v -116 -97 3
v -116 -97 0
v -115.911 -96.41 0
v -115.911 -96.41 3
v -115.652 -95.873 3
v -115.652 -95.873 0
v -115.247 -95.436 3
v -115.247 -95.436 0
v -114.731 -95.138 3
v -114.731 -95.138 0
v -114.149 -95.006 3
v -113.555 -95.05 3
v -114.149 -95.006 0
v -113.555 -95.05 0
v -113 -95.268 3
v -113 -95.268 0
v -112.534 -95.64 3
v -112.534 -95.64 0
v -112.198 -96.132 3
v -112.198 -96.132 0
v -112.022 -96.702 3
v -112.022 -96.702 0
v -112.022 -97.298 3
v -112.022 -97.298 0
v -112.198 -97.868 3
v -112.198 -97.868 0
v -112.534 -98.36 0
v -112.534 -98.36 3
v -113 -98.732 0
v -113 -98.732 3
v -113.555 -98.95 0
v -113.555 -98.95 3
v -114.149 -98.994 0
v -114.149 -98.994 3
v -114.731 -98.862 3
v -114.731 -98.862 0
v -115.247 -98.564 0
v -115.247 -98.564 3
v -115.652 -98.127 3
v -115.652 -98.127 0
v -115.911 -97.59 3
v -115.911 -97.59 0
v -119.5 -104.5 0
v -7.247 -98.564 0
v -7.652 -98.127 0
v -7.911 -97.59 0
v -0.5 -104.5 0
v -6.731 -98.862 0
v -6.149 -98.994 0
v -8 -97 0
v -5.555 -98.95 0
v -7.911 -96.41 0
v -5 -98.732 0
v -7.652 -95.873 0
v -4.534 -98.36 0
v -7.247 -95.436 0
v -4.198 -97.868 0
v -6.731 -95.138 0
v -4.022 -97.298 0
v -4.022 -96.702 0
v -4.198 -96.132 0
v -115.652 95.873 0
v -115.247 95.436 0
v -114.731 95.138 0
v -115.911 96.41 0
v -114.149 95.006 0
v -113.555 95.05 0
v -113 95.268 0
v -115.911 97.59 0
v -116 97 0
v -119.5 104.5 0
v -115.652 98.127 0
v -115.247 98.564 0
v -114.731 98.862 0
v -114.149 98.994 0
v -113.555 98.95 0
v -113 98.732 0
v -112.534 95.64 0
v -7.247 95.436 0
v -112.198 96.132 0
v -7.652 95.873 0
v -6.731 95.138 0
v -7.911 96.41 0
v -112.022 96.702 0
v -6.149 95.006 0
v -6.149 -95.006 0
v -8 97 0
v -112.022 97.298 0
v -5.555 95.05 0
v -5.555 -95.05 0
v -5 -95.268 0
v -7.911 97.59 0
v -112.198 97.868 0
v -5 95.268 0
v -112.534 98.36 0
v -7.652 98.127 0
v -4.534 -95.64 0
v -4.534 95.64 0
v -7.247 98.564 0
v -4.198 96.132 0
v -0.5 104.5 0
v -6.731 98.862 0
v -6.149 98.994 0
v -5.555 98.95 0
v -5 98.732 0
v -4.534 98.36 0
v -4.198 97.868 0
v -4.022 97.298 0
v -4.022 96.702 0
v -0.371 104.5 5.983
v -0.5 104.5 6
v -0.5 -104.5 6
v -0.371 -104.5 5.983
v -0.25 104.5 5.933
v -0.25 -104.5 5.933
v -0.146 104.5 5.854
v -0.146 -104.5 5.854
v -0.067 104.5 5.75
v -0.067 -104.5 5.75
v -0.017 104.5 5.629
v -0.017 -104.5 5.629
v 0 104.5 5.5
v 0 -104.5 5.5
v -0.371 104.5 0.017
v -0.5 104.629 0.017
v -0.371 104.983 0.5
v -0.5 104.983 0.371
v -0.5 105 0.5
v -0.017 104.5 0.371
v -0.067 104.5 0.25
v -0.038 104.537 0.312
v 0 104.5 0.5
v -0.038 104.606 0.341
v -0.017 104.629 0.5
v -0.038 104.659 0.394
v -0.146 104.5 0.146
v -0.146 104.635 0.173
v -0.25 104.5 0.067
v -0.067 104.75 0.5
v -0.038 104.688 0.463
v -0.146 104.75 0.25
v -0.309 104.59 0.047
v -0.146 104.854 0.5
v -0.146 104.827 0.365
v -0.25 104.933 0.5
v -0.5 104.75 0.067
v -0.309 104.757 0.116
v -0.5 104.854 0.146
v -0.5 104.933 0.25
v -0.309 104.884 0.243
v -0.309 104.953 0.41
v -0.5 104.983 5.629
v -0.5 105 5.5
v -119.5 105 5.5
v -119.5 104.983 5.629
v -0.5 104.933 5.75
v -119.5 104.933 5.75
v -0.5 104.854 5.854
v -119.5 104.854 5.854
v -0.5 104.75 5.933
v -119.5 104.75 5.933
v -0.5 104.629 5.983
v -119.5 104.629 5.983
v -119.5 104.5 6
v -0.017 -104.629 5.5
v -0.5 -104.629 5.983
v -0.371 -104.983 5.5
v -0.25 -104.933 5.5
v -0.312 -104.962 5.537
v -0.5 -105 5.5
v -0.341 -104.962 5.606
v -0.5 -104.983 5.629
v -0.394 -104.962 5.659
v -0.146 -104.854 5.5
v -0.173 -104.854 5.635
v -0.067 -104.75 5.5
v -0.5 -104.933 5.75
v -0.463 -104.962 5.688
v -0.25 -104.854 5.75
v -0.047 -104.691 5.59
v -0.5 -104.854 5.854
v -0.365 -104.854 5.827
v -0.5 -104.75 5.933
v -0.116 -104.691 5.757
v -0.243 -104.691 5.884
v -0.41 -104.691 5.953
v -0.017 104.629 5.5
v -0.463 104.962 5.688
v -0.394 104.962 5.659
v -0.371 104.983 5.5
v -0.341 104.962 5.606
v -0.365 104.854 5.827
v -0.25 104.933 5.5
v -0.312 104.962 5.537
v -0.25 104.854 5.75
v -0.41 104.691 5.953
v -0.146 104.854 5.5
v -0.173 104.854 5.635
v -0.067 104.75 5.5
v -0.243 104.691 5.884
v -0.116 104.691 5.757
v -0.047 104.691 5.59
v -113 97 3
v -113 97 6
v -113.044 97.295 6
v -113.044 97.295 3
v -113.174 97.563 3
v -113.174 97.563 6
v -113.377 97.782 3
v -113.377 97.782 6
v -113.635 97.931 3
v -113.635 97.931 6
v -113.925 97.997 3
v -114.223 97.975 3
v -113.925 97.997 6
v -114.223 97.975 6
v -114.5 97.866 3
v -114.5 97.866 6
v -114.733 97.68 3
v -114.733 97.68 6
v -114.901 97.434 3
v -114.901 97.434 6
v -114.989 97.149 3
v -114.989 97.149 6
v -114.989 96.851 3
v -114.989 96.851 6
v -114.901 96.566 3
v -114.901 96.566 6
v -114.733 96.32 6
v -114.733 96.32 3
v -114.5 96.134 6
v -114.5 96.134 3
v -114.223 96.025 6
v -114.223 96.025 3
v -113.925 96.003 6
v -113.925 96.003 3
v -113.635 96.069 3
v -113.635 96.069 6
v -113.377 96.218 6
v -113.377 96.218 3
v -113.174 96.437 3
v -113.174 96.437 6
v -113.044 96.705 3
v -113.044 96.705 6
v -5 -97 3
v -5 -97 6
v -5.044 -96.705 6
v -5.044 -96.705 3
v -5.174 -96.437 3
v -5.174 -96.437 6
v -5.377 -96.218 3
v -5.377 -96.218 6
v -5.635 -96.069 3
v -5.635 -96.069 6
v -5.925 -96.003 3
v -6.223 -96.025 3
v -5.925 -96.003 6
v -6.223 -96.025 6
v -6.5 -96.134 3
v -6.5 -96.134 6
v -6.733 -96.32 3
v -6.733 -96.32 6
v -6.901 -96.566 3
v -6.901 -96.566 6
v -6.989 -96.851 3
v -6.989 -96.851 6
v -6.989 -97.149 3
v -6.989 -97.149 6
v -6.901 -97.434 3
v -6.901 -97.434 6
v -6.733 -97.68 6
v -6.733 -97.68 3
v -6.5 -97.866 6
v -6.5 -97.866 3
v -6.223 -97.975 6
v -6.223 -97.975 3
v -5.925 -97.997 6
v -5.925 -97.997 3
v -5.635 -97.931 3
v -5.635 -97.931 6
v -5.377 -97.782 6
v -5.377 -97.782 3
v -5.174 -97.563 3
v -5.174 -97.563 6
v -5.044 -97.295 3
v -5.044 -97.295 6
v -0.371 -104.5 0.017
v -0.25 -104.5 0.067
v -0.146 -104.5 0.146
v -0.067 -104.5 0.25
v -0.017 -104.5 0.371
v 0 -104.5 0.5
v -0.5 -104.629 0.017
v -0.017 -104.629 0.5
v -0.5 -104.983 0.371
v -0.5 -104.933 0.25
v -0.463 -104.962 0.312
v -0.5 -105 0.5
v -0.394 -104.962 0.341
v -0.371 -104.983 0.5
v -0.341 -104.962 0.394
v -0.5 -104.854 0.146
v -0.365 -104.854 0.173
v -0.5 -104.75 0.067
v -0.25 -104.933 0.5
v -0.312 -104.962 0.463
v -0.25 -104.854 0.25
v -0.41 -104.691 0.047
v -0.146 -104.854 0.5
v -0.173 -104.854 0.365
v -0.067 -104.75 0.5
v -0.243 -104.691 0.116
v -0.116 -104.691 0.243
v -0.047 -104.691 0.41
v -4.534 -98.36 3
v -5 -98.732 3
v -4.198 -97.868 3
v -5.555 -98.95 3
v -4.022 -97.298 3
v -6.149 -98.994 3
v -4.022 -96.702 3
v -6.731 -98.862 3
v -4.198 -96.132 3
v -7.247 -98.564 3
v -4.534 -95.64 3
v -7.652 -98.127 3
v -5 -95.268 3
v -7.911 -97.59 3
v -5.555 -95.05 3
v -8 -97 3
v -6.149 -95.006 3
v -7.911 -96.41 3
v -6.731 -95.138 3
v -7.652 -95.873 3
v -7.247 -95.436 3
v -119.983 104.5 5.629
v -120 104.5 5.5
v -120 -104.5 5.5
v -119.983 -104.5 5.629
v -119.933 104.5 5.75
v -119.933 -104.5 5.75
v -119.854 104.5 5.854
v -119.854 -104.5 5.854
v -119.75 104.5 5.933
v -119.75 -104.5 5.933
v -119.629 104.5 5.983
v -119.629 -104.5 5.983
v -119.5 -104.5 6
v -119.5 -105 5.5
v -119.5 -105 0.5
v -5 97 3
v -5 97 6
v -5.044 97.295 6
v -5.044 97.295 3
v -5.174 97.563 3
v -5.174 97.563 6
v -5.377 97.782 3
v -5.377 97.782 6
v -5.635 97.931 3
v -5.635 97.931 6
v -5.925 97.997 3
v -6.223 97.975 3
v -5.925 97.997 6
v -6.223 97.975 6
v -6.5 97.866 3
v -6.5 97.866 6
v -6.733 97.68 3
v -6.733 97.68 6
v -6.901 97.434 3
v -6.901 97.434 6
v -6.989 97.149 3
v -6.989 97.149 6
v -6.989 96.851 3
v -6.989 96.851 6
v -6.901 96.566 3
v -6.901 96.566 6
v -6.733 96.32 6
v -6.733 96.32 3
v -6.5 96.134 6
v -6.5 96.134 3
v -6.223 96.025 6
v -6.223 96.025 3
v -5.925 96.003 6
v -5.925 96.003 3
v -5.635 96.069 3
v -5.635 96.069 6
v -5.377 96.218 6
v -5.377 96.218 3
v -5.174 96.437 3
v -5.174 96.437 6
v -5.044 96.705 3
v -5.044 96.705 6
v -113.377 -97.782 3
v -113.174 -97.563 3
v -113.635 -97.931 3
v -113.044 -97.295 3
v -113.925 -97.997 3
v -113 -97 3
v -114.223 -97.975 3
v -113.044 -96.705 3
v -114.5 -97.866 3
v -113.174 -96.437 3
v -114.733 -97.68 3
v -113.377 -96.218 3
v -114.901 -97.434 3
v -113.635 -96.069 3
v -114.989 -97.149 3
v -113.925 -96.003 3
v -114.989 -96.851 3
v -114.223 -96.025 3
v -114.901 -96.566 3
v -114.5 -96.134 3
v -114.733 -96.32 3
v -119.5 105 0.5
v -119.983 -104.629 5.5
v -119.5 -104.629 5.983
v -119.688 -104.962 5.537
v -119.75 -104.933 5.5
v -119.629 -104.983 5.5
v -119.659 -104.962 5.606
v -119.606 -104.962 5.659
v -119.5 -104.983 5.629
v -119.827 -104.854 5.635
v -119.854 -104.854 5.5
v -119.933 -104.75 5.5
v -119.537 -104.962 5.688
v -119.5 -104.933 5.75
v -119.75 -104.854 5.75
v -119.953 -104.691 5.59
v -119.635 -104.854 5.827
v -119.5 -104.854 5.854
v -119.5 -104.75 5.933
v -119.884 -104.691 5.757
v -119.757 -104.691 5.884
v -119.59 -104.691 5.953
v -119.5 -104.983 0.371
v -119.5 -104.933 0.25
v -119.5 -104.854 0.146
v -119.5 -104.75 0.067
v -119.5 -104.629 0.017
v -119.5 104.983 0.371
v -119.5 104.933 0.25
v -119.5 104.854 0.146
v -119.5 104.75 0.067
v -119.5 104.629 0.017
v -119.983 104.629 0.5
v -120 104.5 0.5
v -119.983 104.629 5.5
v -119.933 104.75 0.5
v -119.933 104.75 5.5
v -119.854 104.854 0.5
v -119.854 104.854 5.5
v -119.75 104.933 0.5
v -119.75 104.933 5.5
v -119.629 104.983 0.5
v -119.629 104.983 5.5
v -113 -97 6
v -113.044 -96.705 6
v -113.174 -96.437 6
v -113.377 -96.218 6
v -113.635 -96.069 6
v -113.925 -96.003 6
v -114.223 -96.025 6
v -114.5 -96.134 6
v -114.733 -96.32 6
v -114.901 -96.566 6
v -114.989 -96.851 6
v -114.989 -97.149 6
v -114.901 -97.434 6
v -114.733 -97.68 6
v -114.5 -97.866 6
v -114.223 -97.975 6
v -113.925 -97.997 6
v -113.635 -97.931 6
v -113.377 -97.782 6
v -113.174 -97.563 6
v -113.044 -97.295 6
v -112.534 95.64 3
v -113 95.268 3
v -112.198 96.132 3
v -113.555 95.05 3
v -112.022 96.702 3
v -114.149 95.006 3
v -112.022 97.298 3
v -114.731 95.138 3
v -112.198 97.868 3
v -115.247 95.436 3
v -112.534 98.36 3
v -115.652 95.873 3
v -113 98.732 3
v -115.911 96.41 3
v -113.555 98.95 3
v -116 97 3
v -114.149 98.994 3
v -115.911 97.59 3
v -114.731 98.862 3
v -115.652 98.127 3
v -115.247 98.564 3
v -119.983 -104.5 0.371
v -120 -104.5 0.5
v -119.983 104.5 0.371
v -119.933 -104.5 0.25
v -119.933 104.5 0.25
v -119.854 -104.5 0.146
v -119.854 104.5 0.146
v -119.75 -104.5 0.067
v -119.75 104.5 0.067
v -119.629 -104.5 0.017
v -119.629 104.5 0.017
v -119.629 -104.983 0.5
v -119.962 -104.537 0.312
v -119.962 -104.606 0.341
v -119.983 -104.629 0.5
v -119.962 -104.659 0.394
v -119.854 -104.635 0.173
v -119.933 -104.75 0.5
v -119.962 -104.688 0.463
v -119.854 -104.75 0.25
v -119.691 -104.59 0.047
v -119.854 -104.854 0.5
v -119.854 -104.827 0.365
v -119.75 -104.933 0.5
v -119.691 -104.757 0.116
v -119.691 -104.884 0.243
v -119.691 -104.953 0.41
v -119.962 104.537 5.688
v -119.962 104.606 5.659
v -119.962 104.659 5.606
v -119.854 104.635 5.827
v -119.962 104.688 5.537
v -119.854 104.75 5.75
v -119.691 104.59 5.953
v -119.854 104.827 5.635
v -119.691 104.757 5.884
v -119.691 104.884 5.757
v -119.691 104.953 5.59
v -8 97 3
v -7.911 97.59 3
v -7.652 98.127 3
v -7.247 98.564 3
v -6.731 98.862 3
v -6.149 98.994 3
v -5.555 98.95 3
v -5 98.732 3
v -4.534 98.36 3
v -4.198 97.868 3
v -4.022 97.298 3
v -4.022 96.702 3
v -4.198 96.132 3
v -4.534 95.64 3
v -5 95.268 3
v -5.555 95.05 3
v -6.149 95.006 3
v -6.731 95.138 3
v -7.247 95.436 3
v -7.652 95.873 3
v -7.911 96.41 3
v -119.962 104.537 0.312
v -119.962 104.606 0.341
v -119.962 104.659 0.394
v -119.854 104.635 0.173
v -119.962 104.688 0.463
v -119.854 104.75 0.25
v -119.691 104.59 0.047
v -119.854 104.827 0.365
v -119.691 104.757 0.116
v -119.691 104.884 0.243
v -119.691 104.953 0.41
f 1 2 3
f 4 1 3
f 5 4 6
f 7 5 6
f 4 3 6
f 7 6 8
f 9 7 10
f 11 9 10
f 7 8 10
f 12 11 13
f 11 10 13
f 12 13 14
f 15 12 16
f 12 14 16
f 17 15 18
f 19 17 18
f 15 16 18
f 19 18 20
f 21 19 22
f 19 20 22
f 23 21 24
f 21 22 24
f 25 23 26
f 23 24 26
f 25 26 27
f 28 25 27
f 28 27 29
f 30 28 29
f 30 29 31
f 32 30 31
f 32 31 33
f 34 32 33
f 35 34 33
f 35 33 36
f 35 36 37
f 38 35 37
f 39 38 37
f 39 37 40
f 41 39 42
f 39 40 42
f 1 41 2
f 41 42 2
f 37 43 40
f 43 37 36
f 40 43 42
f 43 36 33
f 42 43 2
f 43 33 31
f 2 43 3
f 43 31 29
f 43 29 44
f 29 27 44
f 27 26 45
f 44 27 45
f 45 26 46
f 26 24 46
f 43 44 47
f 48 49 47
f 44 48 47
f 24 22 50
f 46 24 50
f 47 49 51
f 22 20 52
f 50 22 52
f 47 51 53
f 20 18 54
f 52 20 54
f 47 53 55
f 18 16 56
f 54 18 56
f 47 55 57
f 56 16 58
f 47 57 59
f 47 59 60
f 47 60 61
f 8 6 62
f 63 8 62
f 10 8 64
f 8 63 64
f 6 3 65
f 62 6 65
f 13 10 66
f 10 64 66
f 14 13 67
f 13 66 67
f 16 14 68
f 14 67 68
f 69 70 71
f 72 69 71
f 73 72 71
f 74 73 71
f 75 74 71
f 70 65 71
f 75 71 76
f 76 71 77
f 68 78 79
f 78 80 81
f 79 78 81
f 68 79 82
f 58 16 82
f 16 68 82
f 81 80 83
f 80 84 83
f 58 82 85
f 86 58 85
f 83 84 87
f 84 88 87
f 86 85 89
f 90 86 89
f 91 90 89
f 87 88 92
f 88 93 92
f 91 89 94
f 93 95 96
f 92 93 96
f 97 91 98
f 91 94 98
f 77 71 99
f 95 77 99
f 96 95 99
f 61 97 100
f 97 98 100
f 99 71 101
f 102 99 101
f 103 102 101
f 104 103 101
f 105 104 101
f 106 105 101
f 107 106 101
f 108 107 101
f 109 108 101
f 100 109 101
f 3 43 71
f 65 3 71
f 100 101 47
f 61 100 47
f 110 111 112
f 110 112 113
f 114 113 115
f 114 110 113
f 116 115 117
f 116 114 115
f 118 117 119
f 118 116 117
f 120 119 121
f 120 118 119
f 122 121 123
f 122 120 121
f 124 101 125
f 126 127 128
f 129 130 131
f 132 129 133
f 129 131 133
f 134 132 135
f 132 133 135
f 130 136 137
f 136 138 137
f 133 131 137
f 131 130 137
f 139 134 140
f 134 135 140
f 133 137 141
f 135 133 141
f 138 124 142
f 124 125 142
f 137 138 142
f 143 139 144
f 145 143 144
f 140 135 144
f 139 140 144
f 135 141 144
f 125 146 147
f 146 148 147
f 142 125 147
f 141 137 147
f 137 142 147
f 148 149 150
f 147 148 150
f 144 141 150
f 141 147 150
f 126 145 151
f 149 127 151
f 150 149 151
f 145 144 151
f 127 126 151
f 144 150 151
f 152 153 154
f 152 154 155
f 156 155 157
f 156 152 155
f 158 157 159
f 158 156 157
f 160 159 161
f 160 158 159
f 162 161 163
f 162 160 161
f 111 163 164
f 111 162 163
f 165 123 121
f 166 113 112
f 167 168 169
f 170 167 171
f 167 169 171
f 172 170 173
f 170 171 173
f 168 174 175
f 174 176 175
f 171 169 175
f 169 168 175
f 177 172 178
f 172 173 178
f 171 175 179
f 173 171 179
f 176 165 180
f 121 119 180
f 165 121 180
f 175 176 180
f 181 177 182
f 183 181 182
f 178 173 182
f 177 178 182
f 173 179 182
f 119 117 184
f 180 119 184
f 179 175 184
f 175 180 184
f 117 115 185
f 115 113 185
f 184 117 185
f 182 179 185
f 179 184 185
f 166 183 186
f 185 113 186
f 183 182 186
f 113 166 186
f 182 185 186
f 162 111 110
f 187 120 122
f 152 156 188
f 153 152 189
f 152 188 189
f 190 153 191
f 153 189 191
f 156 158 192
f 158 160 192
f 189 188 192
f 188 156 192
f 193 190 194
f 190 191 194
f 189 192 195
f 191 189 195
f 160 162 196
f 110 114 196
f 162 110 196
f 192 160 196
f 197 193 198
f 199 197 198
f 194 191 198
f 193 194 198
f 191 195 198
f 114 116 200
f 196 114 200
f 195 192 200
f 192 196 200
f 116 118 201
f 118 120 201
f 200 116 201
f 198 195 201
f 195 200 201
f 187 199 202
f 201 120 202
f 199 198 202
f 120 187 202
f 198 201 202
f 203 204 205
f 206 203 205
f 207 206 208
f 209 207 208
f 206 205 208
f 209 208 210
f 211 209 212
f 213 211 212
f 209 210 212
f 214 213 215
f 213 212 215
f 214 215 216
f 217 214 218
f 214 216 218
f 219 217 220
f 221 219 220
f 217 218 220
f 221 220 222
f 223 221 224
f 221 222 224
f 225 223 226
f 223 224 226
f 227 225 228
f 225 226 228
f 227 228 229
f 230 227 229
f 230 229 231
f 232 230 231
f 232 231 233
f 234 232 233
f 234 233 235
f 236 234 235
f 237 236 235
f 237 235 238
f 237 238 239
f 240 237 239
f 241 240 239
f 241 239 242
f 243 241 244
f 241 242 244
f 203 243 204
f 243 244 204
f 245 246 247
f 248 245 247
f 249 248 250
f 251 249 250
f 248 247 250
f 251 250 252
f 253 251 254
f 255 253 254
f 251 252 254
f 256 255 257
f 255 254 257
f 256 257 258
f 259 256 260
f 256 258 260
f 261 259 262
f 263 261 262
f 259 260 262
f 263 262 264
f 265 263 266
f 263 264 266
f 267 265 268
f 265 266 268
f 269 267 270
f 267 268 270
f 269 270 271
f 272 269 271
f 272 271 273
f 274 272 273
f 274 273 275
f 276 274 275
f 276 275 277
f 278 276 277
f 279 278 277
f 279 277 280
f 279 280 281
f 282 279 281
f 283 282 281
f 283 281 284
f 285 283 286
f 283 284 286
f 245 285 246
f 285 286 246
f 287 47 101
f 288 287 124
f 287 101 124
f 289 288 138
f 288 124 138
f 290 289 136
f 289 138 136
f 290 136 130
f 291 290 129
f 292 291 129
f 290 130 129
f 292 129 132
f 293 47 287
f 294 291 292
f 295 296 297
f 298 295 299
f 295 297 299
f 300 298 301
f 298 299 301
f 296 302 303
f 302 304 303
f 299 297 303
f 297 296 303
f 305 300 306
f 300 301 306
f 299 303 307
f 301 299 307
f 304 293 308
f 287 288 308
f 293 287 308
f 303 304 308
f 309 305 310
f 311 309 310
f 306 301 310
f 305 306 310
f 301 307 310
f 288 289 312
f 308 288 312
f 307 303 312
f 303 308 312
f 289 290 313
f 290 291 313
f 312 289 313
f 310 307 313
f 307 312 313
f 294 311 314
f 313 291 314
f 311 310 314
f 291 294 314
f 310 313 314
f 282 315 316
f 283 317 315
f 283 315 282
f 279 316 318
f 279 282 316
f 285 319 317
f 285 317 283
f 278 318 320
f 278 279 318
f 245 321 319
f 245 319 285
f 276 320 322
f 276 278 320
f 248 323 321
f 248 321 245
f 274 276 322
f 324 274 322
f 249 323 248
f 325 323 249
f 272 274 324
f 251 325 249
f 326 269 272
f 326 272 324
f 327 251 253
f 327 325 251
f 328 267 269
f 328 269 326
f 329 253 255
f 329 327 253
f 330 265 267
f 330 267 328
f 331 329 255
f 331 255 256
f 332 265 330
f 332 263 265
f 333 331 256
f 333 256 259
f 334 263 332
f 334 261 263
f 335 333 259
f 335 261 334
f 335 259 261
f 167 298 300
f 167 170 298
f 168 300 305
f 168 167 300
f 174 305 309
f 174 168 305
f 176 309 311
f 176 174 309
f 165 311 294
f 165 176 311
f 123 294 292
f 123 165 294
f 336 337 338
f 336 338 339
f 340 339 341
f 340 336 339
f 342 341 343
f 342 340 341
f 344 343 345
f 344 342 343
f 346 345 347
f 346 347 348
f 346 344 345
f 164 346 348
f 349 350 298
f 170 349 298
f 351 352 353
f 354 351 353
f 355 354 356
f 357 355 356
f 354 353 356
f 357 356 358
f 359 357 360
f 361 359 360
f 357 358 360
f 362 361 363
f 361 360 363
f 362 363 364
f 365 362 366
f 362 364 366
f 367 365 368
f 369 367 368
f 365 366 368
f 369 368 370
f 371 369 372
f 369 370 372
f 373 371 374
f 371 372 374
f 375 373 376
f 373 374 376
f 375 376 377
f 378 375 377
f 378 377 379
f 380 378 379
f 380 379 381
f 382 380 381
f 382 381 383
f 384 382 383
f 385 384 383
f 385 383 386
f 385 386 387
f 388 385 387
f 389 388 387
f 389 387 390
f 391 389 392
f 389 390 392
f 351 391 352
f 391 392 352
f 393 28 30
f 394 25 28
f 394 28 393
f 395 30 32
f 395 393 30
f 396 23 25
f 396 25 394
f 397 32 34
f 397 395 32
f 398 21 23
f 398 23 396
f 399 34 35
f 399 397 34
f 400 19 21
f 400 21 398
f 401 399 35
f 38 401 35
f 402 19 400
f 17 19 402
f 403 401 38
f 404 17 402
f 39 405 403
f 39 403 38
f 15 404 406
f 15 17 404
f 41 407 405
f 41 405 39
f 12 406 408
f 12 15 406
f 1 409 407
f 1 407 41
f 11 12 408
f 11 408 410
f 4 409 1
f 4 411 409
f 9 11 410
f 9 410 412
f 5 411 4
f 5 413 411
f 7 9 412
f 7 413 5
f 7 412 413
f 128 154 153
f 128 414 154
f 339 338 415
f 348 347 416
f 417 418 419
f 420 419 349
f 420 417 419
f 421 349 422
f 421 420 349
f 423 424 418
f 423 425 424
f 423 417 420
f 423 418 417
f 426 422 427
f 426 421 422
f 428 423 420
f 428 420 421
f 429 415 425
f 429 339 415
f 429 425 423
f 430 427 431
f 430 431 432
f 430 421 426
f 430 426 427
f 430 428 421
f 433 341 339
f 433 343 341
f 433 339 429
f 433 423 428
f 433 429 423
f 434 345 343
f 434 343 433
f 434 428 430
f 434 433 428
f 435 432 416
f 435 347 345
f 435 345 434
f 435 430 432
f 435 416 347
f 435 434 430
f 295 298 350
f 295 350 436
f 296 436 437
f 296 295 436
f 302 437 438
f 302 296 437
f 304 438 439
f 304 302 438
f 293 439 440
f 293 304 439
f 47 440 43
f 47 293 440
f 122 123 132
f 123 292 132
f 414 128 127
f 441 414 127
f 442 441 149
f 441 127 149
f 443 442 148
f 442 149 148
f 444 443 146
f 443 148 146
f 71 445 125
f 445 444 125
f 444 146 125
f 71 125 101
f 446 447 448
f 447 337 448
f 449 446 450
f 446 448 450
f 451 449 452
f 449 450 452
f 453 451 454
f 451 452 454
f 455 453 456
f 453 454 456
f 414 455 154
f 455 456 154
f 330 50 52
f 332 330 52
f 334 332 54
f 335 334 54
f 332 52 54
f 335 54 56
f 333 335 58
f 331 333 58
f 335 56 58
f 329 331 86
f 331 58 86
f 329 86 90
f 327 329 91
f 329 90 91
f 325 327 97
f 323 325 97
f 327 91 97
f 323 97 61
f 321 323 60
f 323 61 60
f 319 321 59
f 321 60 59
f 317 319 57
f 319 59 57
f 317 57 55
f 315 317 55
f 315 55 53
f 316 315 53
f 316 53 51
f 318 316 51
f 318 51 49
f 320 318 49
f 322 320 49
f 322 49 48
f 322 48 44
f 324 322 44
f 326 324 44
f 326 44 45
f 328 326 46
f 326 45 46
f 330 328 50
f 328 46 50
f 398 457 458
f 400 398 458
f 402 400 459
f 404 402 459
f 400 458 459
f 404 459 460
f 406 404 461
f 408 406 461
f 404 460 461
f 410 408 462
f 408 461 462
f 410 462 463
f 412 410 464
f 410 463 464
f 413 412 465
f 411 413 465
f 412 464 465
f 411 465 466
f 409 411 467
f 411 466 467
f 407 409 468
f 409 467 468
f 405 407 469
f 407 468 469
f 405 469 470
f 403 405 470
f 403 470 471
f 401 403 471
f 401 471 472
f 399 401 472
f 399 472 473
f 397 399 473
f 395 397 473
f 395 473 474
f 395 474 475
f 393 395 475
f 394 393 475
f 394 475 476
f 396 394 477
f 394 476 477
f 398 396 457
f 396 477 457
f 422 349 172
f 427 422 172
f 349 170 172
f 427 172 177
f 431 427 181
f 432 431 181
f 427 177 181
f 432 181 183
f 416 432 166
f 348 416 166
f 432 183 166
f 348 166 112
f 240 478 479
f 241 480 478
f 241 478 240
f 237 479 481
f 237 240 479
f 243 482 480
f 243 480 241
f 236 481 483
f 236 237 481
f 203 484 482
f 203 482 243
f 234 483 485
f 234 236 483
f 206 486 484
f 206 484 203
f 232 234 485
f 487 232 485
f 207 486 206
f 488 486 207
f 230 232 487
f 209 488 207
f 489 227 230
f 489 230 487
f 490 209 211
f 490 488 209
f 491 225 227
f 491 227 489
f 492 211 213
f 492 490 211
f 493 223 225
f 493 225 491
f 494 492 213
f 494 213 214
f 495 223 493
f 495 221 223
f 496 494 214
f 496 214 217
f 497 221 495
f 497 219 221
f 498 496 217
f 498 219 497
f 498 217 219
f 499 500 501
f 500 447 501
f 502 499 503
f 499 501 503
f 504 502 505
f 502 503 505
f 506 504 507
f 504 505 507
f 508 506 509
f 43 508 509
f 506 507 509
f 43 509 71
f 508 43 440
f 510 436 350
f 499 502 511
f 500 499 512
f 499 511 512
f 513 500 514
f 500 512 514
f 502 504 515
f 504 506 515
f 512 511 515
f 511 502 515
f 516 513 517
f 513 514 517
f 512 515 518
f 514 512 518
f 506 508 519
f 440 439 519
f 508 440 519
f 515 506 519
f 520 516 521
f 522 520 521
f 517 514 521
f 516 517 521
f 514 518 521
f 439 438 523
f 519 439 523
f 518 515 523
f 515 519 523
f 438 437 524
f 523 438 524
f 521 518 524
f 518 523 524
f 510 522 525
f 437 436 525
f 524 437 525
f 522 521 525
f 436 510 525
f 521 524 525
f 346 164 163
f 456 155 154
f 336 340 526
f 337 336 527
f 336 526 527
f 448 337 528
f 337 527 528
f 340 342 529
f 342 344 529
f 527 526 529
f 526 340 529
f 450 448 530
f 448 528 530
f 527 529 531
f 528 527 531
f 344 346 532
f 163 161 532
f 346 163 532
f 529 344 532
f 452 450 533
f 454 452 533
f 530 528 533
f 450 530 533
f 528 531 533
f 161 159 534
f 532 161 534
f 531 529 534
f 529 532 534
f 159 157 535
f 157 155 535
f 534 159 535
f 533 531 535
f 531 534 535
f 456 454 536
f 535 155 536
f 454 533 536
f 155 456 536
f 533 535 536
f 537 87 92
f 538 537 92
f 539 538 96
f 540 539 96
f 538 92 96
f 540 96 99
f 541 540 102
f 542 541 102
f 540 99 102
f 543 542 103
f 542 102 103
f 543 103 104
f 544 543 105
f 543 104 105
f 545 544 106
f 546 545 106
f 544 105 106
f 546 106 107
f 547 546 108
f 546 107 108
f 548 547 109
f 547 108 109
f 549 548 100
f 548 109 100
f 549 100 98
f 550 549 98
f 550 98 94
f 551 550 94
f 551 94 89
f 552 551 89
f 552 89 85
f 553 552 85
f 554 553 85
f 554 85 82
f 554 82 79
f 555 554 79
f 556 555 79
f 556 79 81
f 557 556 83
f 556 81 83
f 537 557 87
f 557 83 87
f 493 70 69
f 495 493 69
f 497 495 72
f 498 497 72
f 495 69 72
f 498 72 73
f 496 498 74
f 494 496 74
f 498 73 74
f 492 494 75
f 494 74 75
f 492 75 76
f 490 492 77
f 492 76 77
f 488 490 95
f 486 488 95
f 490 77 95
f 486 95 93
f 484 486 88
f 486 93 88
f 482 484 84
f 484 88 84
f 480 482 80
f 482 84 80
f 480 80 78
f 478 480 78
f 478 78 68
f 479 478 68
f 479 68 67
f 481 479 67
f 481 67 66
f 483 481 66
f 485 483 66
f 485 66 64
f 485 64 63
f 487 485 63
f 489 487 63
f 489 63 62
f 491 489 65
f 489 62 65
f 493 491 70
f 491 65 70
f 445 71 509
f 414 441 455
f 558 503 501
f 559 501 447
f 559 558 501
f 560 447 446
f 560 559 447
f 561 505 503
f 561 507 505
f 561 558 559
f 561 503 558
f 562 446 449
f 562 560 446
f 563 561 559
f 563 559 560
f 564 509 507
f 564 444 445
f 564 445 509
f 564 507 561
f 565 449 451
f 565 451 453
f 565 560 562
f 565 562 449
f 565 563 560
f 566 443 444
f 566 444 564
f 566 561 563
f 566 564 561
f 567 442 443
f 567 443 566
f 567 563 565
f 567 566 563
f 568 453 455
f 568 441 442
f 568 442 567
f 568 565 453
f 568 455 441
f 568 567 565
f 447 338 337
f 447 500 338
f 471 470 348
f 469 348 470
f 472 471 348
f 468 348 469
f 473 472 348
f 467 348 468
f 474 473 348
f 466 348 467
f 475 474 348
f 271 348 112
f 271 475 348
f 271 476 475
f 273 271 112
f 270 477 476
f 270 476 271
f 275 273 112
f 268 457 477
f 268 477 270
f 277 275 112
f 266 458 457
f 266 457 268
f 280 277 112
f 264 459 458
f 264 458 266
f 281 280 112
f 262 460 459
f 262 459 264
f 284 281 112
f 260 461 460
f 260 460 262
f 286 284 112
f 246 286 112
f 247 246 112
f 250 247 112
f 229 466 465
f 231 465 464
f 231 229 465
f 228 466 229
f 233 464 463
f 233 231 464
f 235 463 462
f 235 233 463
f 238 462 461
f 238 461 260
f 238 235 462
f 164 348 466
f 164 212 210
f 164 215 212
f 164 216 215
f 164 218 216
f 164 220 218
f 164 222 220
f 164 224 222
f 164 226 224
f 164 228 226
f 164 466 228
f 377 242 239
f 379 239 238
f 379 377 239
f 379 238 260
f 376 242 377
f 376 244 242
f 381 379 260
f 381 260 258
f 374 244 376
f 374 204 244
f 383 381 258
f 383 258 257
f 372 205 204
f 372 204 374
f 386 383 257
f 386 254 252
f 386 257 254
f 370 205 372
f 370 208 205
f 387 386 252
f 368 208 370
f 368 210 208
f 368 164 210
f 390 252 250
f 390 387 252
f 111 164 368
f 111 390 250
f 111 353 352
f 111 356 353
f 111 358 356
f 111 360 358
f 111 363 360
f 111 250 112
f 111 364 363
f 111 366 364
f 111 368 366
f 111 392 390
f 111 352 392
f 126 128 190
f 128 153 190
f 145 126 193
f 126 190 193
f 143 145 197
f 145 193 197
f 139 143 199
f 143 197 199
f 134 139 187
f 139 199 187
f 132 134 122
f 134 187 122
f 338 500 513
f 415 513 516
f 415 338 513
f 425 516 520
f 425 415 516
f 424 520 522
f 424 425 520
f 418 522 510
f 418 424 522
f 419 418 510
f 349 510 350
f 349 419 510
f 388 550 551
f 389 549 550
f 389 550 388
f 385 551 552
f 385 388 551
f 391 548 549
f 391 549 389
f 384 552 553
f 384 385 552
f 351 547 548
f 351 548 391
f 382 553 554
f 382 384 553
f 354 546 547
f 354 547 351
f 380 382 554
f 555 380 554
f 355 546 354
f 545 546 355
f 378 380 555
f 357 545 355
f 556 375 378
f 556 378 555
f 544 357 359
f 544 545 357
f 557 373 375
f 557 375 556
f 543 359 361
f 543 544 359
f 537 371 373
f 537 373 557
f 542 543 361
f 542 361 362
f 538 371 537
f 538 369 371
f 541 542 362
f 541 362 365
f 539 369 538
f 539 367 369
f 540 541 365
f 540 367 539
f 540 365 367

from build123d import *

# Parameters (mm, degrees)
SKETCH1_W           = 120
SKETCH1_H           = 210
BOSS_EXTRUDE1_DEPTH = 6
SKETCH2_R           = 2
CUT_EXTRUDE1_DEPTH  = 3
SKETCH3_R           = 1
CUT_EXTRUDE2_DEPTH  = 3
FILLET1_R           = 0.5


with BuildPart() as part:
    # Sketch1 → Boss-Extrude1 (new body)
    with BuildSketch(Plane.XY):
        with Locations((-60, 0)):
            Rectangle(SKETCH1_W, SKETCH1_H)
    extrude(amount=BOSS_EXTRUDE1_DEPTH)

    # Sketch2 → Cut-Extrude1 (cut)
    with BuildSketch(Plane(origin=(0, 0, 0), x_dir=(-1, 0, 0), z_dir=(0, 0, -1))):
        with Locations((6, 97)):
            Circle(SKETCH2_R)
        with Locations((114, 97)):
            Circle(SKETCH2_R)
        with Locations((6, -97)):
            Circle(SKETCH2_R)
        with Locations((114, -97)):
            Circle(SKETCH2_R)
    extrude(amount=-CUT_EXTRUDE1_DEPTH, mode=Mode.SUBTRACT)

    # Sketch3 → Cut-Extrude2 (cut)
    with BuildSketch(Plane.XY.offset(6)):
        with Locations((-114, 97)):
            Circle(SKETCH3_R)
        with Locations((-6, 97)):
            Circle(SKETCH3_R)
        with Locations((-6, -97)):
            Circle(SKETCH3_R)
        with Locations((-114, -97)):
            Circle(SKETCH3_R)
    extrude(amount=-CUT_EXTRUDE2_DEPTH, mode=Mode.SUBTRACT)

    # Fillet1
    fillet1_edges = [part.edges().sort_by_distance(p)[0] for p in [
        (0, 0, 6),
        (-60, 105, 6),
        (-120, 0, 6),
        (-60, 105, 0),
        (0, 0, 0),
        (-60, -105, 0),
        (-120, 0, 0),
        (-120, 105, 3),
        (0, 105, 3),
        (0, -105, 3),
        (-120, -105, 3),
        (-60, -105, 6),
    ]]
    fillet(fillet1_edges, radius=FILLET1_R)


solid = part.part
